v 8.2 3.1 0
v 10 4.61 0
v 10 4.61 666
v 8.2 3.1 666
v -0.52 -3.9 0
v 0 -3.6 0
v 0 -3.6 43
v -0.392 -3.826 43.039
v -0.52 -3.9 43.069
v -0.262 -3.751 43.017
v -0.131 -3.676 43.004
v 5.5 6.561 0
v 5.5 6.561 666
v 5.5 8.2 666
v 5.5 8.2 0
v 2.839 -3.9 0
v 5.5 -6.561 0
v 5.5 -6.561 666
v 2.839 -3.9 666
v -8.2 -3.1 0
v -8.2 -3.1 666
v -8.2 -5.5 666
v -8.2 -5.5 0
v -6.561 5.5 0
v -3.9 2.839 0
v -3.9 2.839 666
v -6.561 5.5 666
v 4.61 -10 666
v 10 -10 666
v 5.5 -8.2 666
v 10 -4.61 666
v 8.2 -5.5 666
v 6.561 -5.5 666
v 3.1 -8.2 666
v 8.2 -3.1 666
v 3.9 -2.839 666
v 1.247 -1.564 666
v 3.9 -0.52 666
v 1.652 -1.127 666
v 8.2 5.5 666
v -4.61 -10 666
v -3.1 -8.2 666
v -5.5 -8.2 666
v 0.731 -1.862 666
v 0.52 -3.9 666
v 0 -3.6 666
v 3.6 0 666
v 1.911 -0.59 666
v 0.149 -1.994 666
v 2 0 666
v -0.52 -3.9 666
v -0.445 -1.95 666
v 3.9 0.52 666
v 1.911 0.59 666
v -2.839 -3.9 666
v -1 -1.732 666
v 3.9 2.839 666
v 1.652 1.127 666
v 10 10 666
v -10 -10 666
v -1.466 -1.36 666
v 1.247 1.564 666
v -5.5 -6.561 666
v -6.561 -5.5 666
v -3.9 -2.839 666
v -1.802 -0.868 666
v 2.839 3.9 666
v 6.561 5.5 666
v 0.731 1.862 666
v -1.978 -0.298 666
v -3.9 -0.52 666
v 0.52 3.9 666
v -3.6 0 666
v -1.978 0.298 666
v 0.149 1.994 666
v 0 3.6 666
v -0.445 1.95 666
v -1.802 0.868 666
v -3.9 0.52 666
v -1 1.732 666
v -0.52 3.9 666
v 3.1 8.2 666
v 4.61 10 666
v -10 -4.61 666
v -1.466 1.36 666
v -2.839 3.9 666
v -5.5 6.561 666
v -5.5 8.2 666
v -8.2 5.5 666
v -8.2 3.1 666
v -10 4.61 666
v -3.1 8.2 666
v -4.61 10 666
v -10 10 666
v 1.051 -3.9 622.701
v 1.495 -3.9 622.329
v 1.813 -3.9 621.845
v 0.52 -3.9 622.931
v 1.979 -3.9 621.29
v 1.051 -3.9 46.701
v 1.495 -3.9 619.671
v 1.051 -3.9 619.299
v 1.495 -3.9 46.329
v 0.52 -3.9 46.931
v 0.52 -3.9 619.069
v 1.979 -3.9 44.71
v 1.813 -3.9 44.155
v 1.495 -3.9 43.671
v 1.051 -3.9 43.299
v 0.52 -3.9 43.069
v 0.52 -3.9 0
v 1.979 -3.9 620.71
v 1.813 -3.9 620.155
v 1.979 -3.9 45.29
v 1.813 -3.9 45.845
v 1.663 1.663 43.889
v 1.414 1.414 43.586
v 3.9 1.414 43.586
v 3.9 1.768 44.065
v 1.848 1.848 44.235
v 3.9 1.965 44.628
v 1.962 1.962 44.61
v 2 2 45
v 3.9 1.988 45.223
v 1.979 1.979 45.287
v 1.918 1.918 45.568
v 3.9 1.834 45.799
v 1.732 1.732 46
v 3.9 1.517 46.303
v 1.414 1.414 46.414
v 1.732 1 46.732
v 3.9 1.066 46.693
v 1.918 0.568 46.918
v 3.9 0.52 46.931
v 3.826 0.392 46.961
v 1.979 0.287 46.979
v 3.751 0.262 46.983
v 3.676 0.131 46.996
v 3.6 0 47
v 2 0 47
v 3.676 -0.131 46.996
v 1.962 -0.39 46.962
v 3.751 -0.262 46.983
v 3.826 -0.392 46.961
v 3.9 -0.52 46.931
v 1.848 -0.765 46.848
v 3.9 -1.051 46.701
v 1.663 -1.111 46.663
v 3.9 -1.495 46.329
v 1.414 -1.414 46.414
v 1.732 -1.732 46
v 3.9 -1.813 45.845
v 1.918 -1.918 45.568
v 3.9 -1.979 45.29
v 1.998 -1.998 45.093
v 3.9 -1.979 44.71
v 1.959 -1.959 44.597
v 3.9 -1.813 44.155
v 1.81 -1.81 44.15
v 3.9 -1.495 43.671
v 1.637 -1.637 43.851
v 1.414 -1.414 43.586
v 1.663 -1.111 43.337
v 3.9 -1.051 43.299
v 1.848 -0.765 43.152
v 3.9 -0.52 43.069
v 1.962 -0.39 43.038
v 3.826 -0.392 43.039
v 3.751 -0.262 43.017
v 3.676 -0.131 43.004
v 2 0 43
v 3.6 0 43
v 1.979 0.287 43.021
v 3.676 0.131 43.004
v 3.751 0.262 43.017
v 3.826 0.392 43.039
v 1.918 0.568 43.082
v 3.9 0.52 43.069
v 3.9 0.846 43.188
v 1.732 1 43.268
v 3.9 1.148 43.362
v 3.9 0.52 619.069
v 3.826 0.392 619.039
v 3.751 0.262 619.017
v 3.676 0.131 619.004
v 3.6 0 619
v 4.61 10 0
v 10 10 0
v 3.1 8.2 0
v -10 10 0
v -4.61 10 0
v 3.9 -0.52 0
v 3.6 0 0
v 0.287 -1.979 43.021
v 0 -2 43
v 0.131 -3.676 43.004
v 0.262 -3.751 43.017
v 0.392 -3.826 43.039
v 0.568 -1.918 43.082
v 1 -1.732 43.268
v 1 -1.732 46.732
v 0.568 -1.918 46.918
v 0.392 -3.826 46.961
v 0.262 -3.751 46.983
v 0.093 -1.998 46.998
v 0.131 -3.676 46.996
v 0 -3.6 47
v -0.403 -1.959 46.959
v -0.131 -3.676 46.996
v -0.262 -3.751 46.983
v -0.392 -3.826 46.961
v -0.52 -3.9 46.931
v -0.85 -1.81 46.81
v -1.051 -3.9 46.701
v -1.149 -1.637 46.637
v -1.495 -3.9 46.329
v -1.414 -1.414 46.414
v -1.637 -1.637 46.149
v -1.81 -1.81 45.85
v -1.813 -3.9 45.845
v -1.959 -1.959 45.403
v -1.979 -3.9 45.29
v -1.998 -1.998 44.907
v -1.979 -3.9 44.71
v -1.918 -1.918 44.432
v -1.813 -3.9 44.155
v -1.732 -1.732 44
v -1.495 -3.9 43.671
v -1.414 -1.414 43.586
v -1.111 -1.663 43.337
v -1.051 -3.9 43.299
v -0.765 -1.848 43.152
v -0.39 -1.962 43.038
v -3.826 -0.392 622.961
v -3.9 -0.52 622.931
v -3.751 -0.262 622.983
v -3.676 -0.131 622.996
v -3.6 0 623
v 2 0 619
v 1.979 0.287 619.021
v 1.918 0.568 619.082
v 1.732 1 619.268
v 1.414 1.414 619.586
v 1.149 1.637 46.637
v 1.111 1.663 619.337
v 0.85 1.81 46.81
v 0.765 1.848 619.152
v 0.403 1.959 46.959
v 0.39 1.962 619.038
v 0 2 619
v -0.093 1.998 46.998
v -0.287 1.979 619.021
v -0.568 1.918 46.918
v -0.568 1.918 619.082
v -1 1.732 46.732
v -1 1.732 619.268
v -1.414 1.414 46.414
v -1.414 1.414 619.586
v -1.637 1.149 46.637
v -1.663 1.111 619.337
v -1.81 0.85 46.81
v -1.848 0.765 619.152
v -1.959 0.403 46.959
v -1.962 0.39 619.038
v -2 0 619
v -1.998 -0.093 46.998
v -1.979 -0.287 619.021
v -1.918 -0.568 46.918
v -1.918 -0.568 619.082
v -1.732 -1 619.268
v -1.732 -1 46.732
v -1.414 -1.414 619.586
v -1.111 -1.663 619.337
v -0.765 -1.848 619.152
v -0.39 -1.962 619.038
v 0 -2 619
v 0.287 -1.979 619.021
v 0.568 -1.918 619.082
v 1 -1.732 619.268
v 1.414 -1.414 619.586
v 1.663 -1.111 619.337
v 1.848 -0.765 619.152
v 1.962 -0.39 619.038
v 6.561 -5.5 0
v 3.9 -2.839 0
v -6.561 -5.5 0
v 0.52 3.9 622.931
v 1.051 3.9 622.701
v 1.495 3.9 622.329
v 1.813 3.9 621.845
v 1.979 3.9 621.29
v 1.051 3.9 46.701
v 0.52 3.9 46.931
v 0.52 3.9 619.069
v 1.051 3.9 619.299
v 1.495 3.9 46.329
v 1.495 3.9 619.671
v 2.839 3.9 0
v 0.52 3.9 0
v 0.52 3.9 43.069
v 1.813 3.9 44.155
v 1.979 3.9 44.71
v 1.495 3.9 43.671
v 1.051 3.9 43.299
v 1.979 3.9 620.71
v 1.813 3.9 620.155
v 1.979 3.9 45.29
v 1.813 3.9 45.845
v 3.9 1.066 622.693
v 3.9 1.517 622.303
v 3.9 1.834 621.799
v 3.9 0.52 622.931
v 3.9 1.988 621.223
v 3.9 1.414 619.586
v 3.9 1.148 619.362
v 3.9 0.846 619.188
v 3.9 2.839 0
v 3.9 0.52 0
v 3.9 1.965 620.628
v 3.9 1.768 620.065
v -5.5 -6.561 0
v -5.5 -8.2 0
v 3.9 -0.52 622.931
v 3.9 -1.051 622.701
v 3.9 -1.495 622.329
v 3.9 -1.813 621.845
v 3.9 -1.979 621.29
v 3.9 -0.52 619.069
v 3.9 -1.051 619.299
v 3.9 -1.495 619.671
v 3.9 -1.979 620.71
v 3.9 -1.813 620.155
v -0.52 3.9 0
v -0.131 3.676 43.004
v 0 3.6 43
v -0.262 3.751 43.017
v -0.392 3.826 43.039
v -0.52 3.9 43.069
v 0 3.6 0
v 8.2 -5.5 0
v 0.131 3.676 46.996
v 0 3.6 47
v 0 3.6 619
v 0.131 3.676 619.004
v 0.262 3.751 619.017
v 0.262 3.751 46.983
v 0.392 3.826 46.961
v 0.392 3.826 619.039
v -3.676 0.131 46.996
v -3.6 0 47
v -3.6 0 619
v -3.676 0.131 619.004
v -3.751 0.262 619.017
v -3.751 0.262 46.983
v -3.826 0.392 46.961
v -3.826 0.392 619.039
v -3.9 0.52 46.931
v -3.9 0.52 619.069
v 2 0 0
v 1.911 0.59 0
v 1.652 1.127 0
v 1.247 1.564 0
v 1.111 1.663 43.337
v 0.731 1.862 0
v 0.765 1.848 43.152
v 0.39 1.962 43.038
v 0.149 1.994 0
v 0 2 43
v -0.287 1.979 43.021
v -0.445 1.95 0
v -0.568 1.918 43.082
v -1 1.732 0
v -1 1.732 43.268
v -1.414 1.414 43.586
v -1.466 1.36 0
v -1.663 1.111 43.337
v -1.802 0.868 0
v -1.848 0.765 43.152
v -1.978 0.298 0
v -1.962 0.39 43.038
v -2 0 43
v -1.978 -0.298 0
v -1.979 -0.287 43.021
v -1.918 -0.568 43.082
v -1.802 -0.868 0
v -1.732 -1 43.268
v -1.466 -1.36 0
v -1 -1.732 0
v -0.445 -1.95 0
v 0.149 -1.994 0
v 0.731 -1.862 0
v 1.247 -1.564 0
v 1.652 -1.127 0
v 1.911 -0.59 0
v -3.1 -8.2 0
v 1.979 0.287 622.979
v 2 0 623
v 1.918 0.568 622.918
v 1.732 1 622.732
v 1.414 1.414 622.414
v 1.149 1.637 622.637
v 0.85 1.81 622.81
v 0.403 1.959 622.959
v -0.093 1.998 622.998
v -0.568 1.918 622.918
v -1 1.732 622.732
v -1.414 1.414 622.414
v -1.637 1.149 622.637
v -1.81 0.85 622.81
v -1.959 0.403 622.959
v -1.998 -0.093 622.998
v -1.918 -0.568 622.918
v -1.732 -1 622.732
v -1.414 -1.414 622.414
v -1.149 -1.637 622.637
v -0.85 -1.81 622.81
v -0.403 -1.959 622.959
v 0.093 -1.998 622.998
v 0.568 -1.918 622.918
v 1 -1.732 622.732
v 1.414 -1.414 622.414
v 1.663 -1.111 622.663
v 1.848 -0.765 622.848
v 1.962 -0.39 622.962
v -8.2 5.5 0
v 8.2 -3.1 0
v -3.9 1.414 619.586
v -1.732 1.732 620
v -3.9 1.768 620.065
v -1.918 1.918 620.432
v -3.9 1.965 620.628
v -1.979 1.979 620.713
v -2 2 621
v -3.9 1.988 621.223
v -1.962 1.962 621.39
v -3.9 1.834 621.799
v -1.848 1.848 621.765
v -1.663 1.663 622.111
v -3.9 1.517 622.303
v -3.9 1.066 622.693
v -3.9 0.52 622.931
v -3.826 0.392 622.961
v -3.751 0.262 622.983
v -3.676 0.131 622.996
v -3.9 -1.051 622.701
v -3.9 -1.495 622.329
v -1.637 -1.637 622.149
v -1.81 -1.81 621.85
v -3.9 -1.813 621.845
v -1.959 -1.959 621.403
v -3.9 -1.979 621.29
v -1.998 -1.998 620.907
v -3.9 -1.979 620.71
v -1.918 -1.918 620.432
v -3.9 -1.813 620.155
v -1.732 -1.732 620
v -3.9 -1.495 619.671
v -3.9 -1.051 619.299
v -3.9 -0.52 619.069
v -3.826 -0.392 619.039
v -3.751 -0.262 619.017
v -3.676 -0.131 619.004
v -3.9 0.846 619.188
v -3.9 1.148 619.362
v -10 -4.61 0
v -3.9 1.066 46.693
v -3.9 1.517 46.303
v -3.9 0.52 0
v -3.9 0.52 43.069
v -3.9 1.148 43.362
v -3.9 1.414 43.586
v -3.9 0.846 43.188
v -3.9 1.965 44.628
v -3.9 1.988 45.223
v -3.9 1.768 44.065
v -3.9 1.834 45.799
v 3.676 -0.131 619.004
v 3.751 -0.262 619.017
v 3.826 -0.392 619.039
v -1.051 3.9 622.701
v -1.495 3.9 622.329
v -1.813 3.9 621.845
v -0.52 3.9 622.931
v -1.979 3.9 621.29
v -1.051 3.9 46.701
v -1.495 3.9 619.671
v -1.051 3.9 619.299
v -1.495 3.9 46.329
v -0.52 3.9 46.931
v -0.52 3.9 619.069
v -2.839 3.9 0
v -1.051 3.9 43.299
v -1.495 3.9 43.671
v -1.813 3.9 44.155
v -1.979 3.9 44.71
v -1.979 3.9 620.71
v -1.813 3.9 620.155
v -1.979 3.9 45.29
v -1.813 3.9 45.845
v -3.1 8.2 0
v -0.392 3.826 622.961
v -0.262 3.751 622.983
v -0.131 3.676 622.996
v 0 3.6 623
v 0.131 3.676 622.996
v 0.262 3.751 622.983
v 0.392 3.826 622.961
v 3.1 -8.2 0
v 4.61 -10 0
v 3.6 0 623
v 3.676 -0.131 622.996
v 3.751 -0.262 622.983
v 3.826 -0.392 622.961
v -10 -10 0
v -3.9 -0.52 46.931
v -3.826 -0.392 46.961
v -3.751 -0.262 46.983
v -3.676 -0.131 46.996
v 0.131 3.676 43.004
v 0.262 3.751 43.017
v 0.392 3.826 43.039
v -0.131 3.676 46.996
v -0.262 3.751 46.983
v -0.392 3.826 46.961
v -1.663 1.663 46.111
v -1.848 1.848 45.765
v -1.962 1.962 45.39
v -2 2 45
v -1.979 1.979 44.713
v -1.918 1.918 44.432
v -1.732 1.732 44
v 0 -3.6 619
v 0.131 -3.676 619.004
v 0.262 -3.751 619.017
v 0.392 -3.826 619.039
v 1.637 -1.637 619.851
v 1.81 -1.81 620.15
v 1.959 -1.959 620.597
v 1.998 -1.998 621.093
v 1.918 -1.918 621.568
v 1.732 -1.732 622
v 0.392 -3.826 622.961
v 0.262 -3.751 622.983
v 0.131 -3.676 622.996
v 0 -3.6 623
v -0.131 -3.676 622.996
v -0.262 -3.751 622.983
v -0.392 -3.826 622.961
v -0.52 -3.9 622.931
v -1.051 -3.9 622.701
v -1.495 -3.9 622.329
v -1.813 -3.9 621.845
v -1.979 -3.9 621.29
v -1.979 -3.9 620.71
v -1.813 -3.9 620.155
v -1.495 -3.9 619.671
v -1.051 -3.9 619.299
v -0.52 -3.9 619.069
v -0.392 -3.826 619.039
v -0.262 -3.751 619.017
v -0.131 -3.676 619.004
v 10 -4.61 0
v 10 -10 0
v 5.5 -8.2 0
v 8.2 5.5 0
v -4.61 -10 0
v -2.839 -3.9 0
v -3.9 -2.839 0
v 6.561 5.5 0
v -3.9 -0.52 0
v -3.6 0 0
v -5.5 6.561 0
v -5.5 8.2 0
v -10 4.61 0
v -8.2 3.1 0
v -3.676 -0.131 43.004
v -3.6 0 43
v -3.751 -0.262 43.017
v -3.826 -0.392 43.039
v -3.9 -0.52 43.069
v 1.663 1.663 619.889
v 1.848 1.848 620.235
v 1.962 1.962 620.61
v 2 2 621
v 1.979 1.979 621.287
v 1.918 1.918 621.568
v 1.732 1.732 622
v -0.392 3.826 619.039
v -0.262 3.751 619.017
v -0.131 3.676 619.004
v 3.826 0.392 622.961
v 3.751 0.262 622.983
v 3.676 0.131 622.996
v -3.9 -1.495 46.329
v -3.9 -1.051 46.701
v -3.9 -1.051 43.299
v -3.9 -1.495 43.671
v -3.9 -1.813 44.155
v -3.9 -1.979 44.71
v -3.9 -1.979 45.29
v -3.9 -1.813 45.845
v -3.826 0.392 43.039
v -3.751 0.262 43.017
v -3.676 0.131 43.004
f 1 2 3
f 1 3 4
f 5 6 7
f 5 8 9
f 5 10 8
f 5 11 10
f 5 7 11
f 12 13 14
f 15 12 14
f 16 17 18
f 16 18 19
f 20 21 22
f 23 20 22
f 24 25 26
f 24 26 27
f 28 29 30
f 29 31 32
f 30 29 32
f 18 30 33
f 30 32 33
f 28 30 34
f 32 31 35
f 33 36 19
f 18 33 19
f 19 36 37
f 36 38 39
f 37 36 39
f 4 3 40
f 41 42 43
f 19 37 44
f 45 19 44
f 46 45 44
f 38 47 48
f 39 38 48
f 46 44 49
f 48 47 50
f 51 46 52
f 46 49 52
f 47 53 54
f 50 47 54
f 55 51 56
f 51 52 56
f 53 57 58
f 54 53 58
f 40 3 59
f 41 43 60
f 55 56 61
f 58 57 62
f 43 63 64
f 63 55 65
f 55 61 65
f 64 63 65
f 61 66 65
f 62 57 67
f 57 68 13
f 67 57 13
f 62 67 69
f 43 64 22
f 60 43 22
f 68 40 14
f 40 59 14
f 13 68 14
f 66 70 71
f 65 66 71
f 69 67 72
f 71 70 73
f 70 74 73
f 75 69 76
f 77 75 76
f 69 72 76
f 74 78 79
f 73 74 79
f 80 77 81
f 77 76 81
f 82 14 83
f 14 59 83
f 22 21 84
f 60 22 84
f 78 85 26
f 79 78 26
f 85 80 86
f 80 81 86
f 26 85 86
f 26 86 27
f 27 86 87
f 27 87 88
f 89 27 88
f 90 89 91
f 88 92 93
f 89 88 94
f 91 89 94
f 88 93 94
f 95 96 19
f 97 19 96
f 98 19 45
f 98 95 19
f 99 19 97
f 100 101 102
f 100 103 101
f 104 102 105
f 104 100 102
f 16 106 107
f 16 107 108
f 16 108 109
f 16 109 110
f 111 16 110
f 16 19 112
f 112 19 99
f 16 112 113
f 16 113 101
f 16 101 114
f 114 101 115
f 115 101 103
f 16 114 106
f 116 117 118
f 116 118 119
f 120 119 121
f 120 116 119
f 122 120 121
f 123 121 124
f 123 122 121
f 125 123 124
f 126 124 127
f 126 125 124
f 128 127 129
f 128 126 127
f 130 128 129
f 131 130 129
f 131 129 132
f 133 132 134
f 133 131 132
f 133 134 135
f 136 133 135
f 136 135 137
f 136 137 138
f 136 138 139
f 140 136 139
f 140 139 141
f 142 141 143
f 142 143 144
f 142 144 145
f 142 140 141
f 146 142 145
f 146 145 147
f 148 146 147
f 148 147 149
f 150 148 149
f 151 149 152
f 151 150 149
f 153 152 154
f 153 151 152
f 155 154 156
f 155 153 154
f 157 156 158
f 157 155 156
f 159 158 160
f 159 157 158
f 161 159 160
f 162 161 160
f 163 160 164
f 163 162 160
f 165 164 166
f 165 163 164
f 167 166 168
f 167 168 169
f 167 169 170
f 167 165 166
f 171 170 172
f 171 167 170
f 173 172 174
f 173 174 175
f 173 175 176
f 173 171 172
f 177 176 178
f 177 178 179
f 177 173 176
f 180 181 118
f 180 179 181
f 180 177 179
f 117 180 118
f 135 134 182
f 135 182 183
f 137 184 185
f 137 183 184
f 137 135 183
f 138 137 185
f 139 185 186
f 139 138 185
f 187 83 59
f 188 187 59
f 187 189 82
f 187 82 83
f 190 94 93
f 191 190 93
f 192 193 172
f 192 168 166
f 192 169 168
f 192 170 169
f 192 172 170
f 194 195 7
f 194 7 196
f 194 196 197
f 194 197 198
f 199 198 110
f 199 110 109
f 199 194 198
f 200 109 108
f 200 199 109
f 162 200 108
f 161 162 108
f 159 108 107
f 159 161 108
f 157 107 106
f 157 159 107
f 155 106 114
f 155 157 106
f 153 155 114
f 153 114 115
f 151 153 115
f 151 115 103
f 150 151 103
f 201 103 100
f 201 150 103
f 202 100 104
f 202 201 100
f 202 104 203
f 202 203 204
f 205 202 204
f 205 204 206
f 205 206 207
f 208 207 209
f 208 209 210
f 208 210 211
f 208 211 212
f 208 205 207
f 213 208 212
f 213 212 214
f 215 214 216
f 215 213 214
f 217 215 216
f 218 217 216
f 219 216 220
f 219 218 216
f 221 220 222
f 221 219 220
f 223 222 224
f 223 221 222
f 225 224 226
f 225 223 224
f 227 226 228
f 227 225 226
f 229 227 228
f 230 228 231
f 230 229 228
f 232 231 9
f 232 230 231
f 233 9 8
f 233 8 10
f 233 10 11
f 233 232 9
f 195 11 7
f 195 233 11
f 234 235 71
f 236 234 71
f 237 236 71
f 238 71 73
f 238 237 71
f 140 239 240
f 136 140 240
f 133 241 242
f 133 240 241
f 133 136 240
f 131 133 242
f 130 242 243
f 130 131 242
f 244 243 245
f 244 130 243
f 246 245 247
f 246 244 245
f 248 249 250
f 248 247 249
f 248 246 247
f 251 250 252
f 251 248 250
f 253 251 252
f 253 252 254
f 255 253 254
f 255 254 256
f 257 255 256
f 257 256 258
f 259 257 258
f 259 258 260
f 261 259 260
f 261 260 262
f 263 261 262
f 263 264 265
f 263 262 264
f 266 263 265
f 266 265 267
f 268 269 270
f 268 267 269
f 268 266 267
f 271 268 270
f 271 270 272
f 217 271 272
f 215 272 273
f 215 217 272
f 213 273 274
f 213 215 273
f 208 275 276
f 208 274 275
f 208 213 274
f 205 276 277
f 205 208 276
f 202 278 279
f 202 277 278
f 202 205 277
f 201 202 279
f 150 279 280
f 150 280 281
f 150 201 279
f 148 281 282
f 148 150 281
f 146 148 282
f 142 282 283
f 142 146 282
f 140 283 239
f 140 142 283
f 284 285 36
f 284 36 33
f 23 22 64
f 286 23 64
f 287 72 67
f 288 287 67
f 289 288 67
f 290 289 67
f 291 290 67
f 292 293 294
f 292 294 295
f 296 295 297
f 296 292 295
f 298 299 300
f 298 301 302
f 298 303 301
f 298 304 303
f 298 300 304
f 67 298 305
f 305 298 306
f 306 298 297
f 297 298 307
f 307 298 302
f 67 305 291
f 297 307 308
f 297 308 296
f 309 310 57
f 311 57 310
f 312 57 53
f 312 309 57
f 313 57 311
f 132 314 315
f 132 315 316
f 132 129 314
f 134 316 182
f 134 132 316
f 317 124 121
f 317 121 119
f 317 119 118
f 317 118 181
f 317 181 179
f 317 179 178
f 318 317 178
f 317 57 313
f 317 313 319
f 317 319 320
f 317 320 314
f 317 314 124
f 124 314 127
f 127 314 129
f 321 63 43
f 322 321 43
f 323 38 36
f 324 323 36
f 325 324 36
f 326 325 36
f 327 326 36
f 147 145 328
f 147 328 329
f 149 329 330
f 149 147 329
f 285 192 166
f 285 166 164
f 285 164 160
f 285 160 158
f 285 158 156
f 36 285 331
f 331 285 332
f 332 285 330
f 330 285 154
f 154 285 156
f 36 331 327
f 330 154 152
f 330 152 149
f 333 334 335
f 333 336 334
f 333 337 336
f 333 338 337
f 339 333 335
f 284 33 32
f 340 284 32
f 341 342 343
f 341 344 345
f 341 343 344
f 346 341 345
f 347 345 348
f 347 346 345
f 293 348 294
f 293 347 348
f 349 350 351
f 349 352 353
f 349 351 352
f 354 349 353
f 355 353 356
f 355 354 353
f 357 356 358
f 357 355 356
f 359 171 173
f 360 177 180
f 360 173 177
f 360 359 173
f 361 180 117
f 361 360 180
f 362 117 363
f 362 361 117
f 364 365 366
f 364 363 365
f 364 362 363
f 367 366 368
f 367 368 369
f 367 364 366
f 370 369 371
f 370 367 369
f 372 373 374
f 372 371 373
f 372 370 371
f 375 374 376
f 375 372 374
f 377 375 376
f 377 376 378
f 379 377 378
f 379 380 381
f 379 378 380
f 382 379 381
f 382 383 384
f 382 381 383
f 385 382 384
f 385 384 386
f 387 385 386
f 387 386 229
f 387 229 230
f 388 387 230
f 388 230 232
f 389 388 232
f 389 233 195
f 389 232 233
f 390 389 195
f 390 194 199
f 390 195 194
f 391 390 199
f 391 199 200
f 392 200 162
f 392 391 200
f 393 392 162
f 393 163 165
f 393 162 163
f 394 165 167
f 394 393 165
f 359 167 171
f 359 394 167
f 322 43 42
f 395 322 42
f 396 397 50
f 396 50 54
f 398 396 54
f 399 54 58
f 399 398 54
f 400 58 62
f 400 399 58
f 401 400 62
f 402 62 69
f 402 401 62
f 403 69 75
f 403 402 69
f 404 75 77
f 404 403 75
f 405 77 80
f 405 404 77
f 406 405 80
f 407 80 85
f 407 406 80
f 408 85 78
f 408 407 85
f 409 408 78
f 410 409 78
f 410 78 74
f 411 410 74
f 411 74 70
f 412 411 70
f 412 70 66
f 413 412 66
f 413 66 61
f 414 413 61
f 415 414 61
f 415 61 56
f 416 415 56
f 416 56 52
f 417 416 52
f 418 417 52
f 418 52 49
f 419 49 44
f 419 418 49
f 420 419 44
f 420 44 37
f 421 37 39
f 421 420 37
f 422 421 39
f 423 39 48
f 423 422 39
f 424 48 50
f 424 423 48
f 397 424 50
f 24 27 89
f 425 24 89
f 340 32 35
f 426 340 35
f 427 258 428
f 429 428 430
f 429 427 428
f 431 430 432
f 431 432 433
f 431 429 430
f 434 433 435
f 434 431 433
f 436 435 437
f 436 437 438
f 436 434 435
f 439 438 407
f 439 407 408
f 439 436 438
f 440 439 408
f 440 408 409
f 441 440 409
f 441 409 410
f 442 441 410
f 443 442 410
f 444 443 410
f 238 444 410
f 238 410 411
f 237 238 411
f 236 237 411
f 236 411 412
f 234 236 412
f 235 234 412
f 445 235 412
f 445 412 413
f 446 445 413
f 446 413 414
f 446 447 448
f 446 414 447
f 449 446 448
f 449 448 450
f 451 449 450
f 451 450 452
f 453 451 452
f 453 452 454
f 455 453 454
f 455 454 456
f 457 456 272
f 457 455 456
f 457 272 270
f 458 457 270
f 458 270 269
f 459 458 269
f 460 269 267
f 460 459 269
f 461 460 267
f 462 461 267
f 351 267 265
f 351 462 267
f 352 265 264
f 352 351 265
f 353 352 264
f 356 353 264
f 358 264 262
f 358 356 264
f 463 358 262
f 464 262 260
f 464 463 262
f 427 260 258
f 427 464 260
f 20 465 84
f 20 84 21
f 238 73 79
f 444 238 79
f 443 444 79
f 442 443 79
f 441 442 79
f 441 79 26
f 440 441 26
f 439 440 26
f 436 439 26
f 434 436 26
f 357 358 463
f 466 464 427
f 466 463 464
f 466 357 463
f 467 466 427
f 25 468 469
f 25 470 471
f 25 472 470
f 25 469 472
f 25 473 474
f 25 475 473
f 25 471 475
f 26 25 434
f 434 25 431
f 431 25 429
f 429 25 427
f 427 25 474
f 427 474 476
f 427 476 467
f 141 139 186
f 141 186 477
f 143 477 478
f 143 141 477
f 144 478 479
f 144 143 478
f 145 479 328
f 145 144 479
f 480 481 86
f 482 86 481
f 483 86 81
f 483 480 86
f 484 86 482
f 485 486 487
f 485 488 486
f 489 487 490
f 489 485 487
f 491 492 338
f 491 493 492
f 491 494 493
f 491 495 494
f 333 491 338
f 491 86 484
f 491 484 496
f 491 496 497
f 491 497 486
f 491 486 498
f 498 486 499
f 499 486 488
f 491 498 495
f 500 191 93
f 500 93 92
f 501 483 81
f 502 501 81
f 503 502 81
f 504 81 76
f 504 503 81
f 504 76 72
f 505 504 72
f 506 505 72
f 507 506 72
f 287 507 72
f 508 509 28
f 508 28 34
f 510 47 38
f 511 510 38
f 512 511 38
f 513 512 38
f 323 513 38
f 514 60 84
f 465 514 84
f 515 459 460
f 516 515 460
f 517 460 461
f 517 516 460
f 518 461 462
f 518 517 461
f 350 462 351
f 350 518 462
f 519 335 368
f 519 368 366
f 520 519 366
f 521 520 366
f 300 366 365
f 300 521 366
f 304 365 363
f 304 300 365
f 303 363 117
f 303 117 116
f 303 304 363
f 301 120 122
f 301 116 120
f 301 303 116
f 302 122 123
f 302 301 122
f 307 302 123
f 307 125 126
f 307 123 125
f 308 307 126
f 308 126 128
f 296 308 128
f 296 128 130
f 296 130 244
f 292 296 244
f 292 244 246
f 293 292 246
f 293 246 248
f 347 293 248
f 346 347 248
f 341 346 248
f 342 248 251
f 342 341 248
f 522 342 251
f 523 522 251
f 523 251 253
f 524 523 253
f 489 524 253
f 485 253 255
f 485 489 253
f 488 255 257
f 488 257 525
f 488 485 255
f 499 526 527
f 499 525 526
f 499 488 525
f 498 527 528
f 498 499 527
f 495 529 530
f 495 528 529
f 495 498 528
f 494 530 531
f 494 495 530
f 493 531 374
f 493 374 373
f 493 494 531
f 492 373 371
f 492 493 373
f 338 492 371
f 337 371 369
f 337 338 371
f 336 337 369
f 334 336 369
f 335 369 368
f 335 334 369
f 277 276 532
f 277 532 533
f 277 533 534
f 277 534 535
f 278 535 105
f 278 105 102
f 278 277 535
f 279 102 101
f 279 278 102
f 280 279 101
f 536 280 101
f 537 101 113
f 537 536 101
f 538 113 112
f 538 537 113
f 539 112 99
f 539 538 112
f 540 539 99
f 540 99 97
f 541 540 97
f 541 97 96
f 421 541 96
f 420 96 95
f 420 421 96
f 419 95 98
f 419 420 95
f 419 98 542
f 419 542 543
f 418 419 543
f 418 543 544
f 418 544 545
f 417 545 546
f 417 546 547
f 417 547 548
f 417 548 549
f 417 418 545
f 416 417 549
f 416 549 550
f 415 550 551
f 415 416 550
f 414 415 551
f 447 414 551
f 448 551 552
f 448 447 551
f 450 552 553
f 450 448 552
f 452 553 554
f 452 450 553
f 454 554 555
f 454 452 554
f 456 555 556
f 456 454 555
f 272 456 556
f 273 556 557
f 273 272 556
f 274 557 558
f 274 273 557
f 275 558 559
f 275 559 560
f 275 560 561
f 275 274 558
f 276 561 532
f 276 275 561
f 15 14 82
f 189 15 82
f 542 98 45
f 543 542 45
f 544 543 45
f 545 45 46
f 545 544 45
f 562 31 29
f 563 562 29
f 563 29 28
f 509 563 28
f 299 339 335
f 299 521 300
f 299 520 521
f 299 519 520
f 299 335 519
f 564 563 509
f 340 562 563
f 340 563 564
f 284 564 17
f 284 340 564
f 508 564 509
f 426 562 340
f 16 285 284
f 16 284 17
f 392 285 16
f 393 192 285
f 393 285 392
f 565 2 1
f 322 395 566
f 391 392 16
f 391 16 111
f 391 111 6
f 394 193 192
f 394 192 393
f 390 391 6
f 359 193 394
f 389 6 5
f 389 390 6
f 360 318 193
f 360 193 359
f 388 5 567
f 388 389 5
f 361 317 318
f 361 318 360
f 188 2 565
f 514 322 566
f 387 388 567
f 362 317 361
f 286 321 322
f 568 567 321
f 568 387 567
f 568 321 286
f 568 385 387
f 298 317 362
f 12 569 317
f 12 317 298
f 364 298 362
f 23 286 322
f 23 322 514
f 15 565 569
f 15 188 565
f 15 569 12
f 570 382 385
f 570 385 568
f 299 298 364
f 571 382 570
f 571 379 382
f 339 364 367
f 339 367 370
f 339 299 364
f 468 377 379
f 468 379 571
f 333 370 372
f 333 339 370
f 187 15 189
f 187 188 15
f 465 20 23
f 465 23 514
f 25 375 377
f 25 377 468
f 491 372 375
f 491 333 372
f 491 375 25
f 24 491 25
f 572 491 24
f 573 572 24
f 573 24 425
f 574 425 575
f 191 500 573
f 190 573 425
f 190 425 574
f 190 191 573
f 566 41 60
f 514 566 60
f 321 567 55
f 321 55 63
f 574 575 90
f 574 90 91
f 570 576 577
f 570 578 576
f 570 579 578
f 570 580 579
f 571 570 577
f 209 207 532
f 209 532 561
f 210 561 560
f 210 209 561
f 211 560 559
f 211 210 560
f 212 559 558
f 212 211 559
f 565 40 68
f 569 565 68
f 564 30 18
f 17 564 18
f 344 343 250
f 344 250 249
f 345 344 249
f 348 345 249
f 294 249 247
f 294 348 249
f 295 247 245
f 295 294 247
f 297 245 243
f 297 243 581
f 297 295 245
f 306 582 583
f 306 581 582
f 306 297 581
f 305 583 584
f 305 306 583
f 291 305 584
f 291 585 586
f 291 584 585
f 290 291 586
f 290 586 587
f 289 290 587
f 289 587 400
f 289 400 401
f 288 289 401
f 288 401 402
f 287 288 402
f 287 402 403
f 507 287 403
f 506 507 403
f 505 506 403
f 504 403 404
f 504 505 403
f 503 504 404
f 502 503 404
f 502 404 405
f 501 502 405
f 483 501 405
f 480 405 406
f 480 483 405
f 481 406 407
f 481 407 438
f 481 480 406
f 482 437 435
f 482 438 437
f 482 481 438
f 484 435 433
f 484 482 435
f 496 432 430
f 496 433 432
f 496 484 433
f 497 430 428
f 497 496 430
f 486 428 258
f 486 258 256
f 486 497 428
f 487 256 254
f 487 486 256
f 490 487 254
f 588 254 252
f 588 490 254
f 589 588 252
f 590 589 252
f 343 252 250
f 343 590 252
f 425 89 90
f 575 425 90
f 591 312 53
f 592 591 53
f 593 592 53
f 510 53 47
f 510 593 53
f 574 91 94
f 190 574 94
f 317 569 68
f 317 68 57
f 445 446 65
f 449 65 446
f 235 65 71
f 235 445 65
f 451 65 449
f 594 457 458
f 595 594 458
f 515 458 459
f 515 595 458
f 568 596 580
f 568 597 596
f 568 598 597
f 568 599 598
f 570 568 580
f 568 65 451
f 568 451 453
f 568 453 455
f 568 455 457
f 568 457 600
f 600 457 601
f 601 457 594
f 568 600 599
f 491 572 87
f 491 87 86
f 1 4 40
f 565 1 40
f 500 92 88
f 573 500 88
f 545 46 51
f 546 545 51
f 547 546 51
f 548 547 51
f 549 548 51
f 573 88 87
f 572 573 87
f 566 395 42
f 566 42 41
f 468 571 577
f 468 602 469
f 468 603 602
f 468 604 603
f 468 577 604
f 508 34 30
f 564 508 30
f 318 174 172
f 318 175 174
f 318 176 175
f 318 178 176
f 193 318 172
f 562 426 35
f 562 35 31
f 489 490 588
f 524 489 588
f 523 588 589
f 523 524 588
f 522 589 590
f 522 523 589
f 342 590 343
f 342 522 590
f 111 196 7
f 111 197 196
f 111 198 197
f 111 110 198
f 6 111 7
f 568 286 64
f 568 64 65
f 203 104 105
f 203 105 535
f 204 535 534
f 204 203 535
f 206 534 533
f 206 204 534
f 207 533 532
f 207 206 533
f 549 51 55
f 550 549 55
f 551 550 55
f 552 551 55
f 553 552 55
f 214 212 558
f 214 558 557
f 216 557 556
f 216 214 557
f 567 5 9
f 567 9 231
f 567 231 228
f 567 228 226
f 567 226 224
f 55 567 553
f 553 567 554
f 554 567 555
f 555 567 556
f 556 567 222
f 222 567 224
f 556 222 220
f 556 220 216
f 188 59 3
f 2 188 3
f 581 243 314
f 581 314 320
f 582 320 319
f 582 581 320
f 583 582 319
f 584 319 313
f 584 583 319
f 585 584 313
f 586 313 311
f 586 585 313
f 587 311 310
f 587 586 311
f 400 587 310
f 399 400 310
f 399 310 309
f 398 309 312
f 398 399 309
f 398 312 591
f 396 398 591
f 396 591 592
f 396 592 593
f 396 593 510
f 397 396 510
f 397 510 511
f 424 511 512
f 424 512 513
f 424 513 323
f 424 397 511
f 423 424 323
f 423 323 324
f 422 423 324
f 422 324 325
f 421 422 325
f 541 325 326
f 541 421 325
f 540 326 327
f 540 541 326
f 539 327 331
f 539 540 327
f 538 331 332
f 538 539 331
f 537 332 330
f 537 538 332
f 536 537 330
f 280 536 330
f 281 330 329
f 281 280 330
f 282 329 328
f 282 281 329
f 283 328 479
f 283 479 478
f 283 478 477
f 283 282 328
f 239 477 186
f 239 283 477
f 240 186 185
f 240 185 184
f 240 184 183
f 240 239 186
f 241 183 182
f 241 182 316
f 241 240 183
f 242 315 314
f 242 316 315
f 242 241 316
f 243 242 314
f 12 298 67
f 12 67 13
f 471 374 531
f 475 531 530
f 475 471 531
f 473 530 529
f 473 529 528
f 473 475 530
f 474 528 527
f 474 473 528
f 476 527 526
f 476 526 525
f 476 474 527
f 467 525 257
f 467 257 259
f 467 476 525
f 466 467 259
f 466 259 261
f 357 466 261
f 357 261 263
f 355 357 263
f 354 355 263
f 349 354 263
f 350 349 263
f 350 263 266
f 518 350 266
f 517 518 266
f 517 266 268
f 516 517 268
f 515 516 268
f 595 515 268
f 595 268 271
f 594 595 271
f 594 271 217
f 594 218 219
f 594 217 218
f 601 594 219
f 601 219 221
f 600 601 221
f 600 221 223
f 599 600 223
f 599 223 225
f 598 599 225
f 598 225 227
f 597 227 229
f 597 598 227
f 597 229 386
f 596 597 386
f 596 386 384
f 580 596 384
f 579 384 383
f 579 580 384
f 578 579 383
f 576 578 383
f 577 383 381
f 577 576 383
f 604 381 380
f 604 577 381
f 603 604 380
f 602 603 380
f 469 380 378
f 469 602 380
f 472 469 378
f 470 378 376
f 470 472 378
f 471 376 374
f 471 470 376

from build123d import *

# Parameters (mm, degrees)
SKETCH1_R               = 2
BOSS_EXTRUDE1_DEPTH     = 666
CUT_EXTRUDE1_DEPTH      = 667.220091261
CUT_EXTRUDE1_DEPTH_BACK = 667.220091261
SKETCH2_R               = 2
CUT_EXTRUDE2_DEPTH      = 667.220091261
CUT_EXTRUDE2_DEPTH_BACK = 667.220091261
SKETCH3_R               = 2


with BuildPart() as part:
    # Sketch1 → Boss-Extrude1 (new body)
    with BuildSketch(Plane.XY):
        Polygon((10, 10), (10, 4.610379336), (8.2, 3.1), (8.2, 5.5), (6.560660172, 5.5), (3.9, 2.839339828), (3.9, 0.519615242), (3.6, 0), (3.9, -0.519615242), (3.9, -2.839339828), (6.560660172, -5.5), (8.2, -5.5), (8.2, -3.1), (10, -4.610379336), (10, -10), (4.610379336, -10), (3.1, -8.2), (5.5, -8.2), (5.5, -6.560660172), (2.839339828, -3.9), (0.519615242, -3.9), (0, -3.6), (-0.519615242, -3.9), (-2.839339828, -3.9), (-5.5, -6.560660172), (-5.5, -8.2), (-3.1, -8.2), (-4.610379336, -10), (-10, -10), (-10, -4.610379336), (-8.2, -3.1), (-8.2, -5.5), (-6.560660172, -5.5), (-3.9, -2.839339828), (-3.9, -0.519615242), (-3.6, 0), (-3.9, 0.519615242), (-3.9, 2.839339828), (-6.560660172, 5.5), (-8.2, 5.5), (-8.2, 3.1), (-10, 4.610379336), (-10, 10), (-4.610379336, 10), (-3.1, 8.2), (-5.5, 8.2), (-5.5, 6.560660172), (-2.839339828, 3.9), (-0.519615242, 3.9), (0, 3.6), (0.519615242, 3.9), (2.839339828, 3.9), (5.5, 6.560660172), (5.5, 8.2), (3.1, 8.2), (4.610379336, 10), align=None)
        Circle(SKETCH1_R, mode=Mode.SUBTRACT)
    extrude(amount=BOSS_EXTRUDE1_DEPTH)

    # Sketch2 → Cut-Extrude1 (cut, two sides: drawn at the far end of the back side and taken through both)
    with BuildSketch(Plane(origin=(0, -3.9, 0), x_dir=(-1, 0, 0), z_dir=(0, -1, 0)).offset(-CUT_EXTRUDE1_DEPTH_BACK)):
        with Locations(Location((0, -621, 0), (0, 0, 90))):
            Circle(SKETCH2_R)
        with Locations(Location((0, -45, 0), (0, 0, 90))):
            Circle(SKETCH2_R)
    extrude(amount=CUT_EXTRUDE1_DEPTH + CUT_EXTRUDE1_DEPTH_BACK, mode=Mode.SUBTRACT)

    # Sketch3 → Cut-Extrude2 (cut, two sides: drawn at the far end of the back side and taken through both)
    with BuildSketch(Plane(origin=(3.9, 0, 0), x_dir=(0, 0, -1), z_dir=(1, 0, 0)).offset(-CUT_EXTRUDE2_DEPTH_BACK)):
        with Locations(Location((-45, 0, 0), (0, 0, 45))):
            Circle(SKETCH3_R)
        with Locations(Location((-621, 0, 0), (0, 0, 45))):
            Circle(SKETCH3_R)
    extrude(amount=CUT_EXTRUDE2_DEPTH + CUT_EXTRUDE2_DEPTH_BACK, mode=Mode.SUBTRACT)


solid = part.part
